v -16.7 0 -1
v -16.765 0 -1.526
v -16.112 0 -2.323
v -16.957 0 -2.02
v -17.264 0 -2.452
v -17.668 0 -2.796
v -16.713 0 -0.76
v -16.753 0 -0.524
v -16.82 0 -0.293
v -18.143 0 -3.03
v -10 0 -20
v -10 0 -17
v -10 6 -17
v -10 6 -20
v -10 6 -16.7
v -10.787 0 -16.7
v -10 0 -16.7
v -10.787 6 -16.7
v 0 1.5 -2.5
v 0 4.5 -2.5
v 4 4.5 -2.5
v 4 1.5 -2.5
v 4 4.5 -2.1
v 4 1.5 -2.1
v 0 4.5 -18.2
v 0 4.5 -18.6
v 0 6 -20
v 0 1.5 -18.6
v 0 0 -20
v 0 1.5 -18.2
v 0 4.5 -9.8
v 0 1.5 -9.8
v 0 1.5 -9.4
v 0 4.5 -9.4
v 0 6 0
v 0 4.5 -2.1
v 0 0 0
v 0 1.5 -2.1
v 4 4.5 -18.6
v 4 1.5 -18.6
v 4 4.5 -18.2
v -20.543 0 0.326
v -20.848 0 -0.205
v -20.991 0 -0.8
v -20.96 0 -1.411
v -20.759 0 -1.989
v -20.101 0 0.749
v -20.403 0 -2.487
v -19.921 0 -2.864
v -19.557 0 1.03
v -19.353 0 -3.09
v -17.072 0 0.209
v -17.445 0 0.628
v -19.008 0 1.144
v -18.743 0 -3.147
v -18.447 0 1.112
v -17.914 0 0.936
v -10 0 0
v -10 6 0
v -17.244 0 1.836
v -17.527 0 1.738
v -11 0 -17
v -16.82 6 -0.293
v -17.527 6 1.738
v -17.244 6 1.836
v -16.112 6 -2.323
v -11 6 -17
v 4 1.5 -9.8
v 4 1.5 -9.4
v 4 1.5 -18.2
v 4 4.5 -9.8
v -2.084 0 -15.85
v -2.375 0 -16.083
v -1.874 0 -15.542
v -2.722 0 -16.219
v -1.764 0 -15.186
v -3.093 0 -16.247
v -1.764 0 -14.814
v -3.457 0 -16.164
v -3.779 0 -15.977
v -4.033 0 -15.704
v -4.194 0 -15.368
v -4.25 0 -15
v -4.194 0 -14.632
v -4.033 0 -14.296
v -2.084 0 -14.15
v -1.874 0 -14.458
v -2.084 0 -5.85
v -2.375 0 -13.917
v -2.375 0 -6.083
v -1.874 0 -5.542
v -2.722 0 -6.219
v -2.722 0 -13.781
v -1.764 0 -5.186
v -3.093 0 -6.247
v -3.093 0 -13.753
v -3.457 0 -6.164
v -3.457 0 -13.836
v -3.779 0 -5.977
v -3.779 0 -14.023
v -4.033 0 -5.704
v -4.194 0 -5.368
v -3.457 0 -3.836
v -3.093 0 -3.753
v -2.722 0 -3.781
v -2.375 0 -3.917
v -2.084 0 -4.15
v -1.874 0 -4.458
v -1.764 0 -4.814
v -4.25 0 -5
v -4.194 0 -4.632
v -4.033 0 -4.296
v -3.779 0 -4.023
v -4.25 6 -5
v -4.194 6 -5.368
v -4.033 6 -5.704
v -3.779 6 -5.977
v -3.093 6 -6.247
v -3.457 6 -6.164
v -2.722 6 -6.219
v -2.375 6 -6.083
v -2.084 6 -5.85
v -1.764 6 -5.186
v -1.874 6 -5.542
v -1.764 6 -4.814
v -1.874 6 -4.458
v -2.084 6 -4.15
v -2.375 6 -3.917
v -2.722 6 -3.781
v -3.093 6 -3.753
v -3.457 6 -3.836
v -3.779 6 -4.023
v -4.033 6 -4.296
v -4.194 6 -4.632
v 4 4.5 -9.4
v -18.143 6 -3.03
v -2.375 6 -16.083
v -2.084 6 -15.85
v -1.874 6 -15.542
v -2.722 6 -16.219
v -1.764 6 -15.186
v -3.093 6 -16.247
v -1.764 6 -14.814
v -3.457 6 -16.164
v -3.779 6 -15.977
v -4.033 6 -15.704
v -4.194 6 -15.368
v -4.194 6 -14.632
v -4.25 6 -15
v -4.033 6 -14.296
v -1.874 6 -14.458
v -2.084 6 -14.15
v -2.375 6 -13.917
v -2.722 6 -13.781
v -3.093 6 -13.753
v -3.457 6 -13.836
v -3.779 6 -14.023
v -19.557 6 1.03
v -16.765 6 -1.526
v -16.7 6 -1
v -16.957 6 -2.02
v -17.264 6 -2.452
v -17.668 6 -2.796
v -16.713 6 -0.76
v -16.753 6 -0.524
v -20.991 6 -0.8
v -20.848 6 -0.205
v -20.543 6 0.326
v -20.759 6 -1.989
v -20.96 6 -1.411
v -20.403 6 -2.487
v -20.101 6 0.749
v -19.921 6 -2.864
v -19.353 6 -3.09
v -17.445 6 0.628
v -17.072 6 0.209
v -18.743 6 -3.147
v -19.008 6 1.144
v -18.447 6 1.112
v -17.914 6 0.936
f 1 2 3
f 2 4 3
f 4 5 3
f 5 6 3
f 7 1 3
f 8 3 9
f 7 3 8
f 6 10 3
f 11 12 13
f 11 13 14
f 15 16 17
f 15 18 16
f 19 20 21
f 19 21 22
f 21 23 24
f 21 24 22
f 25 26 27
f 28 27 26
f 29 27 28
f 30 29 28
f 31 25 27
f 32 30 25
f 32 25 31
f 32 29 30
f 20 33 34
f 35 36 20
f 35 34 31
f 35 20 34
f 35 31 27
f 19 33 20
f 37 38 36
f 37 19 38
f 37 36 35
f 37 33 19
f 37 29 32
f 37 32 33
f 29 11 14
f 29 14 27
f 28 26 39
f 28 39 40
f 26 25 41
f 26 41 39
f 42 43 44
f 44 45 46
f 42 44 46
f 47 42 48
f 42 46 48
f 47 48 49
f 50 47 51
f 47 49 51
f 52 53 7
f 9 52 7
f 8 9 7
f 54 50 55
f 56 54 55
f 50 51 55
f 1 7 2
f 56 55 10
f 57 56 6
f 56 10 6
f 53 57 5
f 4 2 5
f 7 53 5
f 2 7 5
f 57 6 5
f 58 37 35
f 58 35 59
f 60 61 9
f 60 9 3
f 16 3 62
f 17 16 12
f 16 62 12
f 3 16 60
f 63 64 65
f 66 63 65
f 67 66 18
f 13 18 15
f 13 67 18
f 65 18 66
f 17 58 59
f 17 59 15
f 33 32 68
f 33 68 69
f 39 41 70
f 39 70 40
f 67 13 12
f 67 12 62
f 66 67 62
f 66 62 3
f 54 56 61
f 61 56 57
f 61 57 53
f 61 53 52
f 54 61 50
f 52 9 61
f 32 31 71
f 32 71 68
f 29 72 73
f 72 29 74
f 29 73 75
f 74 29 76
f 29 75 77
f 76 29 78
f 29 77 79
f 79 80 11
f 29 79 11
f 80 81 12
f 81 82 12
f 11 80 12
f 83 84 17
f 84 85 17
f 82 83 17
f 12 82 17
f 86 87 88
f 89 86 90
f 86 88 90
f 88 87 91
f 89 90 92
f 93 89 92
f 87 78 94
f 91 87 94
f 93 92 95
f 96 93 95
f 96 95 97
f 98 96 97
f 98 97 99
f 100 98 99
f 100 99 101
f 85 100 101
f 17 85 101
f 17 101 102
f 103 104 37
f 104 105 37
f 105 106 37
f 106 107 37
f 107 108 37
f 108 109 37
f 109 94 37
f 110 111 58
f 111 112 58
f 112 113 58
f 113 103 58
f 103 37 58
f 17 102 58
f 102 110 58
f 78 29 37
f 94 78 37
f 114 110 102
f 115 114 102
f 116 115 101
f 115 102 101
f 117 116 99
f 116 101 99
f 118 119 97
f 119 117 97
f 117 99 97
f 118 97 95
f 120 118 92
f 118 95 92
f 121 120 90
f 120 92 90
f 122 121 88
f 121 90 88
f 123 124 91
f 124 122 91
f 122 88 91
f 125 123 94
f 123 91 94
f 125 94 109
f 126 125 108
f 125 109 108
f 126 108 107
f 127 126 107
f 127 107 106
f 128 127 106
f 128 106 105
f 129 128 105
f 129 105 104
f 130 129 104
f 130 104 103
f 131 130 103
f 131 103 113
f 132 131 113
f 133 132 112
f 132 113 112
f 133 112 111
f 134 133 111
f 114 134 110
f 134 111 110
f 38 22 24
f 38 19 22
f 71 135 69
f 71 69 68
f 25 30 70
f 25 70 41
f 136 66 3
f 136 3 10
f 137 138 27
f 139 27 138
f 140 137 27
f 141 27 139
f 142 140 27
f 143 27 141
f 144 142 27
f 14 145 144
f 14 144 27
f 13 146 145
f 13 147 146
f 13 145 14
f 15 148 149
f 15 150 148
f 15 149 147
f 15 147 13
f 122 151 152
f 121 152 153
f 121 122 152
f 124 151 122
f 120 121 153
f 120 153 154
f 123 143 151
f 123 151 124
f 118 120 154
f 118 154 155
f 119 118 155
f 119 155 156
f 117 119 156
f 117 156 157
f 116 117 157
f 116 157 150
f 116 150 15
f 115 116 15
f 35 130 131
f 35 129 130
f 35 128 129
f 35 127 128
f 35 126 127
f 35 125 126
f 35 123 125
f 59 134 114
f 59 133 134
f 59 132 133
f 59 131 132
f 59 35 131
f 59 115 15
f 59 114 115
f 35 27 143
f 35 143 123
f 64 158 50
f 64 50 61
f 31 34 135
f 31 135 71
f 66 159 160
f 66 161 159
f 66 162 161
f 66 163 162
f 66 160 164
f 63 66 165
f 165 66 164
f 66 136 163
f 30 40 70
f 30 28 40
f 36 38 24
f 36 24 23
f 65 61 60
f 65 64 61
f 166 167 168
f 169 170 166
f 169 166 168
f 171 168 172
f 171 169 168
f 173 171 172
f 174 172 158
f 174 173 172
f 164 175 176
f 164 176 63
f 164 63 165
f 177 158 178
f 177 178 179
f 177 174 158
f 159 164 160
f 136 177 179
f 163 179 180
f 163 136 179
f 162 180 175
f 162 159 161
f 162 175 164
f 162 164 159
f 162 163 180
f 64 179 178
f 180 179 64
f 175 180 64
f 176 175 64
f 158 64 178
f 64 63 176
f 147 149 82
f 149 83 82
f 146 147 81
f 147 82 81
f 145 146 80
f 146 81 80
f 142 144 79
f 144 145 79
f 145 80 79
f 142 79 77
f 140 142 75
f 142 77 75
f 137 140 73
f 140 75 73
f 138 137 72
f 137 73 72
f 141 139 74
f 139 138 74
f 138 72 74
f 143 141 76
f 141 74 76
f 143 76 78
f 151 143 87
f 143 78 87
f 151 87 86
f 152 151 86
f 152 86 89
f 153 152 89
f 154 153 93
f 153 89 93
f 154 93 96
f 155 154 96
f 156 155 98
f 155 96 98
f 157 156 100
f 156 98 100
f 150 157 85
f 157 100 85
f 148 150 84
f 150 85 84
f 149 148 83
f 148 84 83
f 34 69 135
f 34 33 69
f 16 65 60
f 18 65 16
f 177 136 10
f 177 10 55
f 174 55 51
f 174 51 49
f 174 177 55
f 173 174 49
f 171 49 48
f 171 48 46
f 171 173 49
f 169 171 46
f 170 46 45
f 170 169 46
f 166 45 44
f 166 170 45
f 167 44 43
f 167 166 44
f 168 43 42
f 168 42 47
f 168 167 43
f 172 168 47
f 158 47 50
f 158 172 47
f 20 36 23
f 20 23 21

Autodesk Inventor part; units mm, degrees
ref_plane "YZ Plane" through (0, 0, 0) normal (1, 0, 0) x (0, 1, 0)
ref_plane "XZ Plane" through (0, 0, 0) normal (0, 1, 0) x (-1, 0, 0)
ref_plane "XY Plane" through (0, 0, 0) normal (0, 0, 1) x (1, 0, 0)
sketch "Sketch1" plane through (0, 0, 0) normal (0, 1, 0) x (-1, 0, 0)
  line L0 (0, 0) -> (10, 0)
  line L1 (10, 0) -> (10, -20)
  line L2 (10, -20) -> (0, -20)
  line L3 (0, -20) -> (0, 0)
  circle A0 centre (3, -5) radius 1.25
  circle A1 centre (3, -15) radius 1.25
  dimension "d0" = 10
  dimension "d1" = 20
  dimension "d2" = 2.5
  dimension "d3" = 2.5
  dimension "d4" = 3
  dimension "d5" = 3
  dimension "d6" = 5
  dimension "d7" = 5
extrude "Extrusion1" add sketch "Sketch1" along normal blind 6
sketch "Sketch2" plane through (0, 6, 0) normal (0, 1, 0) x (1, 0, 0)
  line L0 (0, 20) -> (-10, 20) projected
  line L1 (-10, 20) -> (-10, 0) projected
  line L2 (-10, 0) -> (0, 0) projected
  line L3 (0, 0) -> (0, 20) projected
  circle A0 centre (-3, 15) radius 1.25 projected
  circle A1 centre (-3, 5) radius 1.25 projected
  circle A2 centre (-18.85, 1) radius 2.15
  line L4 (-10, 20) -> (-10, 0) projected
  line L5 (-10, 17) -> (-11, 17)
  line L6 (-11, 17) -> (-17.5269, -1.7376)
  line L7 (-16.1124, 2.3231) -> (-18.1428, 3.0303)
  line L8 (-19.5572, -1.0303) -> (-17.2436, -1.8363)
  line L9 (-17.2436, -1.8363) -> (-10.7868, 16.7)
  line L10 (-10.7868, 16.7) -> (-10, 16.7)
  dimension "d10" = 4.3
  dimension "d11" = 18.85
  dimension "d12" = 1
  dimension "d13" = 1
  dimension "d15" = 3
  dimension "d16" = 0.3
  dimension "d17" = 0.3
extrude "Extrusion2" add sketch "Sketch2" against normal blind 6 contours L1 L10 L9 L8 L6 L5 | L6 A2 L7 | L6 L8 A2 | A2
sketch "Sketch3" plane through (0, 0, 0) normal (1, 0, 0) x (0, 0, -1)
  line L0 (2.1, 4.5) -> (2.5, 4.5)
  line L1 (2.5, 4.5) -> (2.5, 1.5)
  line L2 (2.5, 1.5) -> (2.1, 1.5)
  line L3 (2.1, 1.5) -> (2.1, 4.5)
  line L4 (0, 0) -> (20, 0) projected
  line L5 (20, 0) -> (20, 6) projected
  line L6 (0, 6) -> (20, 6) projected
  line L7 (0, 0) -> (0, 6) projected
  line L8 (9.4, 4.5) -> (9.8, 4.5)
  line L9 (9.8, 4.5) -> (9.8, 1.5)
  line L10 (9.8, 1.5) -> (9.4, 1.5)
  line L11 (9.4, 1.5) -> (9.4, 4.5)
  line L12 (18.2, 4.5) -> (18.6, 4.5)
  line L13 (18.6, 4.5) -> (18.6, 1.5)
  line L14 (18.6, 1.5) -> (18.2, 1.5)
  line L15 (18.2, 1.5) -> (18.2, 4.5)
  dimension "d20" = 3
  dimension "d21" = 3
  dimension "d22" = 3
  dimension "d23" = 0.4
  dimension "d24" = 0.4
  dimension "d25" = 0.4
  dimension "d26" = 1.5
  dimension "d27" = 1.5
  dimension "d28" = 2.5
  dimension "d29" = 7.7
  dimension "d31" = 16.5
extrude "Extrusion3" add sketch "Sketch3" along normal blind 4 contours L0 L1 L2 L3 | L8 L9 L10 L11 | L12 L13 L14 L15
equation "\"d21\" = d20"
equation "\"d22\" = d21"
equation "\"d24\" = d23"
equation "\"d25\" = d23"
equation "\"d27\" = d26"
properties part number "LimitSwitch"
